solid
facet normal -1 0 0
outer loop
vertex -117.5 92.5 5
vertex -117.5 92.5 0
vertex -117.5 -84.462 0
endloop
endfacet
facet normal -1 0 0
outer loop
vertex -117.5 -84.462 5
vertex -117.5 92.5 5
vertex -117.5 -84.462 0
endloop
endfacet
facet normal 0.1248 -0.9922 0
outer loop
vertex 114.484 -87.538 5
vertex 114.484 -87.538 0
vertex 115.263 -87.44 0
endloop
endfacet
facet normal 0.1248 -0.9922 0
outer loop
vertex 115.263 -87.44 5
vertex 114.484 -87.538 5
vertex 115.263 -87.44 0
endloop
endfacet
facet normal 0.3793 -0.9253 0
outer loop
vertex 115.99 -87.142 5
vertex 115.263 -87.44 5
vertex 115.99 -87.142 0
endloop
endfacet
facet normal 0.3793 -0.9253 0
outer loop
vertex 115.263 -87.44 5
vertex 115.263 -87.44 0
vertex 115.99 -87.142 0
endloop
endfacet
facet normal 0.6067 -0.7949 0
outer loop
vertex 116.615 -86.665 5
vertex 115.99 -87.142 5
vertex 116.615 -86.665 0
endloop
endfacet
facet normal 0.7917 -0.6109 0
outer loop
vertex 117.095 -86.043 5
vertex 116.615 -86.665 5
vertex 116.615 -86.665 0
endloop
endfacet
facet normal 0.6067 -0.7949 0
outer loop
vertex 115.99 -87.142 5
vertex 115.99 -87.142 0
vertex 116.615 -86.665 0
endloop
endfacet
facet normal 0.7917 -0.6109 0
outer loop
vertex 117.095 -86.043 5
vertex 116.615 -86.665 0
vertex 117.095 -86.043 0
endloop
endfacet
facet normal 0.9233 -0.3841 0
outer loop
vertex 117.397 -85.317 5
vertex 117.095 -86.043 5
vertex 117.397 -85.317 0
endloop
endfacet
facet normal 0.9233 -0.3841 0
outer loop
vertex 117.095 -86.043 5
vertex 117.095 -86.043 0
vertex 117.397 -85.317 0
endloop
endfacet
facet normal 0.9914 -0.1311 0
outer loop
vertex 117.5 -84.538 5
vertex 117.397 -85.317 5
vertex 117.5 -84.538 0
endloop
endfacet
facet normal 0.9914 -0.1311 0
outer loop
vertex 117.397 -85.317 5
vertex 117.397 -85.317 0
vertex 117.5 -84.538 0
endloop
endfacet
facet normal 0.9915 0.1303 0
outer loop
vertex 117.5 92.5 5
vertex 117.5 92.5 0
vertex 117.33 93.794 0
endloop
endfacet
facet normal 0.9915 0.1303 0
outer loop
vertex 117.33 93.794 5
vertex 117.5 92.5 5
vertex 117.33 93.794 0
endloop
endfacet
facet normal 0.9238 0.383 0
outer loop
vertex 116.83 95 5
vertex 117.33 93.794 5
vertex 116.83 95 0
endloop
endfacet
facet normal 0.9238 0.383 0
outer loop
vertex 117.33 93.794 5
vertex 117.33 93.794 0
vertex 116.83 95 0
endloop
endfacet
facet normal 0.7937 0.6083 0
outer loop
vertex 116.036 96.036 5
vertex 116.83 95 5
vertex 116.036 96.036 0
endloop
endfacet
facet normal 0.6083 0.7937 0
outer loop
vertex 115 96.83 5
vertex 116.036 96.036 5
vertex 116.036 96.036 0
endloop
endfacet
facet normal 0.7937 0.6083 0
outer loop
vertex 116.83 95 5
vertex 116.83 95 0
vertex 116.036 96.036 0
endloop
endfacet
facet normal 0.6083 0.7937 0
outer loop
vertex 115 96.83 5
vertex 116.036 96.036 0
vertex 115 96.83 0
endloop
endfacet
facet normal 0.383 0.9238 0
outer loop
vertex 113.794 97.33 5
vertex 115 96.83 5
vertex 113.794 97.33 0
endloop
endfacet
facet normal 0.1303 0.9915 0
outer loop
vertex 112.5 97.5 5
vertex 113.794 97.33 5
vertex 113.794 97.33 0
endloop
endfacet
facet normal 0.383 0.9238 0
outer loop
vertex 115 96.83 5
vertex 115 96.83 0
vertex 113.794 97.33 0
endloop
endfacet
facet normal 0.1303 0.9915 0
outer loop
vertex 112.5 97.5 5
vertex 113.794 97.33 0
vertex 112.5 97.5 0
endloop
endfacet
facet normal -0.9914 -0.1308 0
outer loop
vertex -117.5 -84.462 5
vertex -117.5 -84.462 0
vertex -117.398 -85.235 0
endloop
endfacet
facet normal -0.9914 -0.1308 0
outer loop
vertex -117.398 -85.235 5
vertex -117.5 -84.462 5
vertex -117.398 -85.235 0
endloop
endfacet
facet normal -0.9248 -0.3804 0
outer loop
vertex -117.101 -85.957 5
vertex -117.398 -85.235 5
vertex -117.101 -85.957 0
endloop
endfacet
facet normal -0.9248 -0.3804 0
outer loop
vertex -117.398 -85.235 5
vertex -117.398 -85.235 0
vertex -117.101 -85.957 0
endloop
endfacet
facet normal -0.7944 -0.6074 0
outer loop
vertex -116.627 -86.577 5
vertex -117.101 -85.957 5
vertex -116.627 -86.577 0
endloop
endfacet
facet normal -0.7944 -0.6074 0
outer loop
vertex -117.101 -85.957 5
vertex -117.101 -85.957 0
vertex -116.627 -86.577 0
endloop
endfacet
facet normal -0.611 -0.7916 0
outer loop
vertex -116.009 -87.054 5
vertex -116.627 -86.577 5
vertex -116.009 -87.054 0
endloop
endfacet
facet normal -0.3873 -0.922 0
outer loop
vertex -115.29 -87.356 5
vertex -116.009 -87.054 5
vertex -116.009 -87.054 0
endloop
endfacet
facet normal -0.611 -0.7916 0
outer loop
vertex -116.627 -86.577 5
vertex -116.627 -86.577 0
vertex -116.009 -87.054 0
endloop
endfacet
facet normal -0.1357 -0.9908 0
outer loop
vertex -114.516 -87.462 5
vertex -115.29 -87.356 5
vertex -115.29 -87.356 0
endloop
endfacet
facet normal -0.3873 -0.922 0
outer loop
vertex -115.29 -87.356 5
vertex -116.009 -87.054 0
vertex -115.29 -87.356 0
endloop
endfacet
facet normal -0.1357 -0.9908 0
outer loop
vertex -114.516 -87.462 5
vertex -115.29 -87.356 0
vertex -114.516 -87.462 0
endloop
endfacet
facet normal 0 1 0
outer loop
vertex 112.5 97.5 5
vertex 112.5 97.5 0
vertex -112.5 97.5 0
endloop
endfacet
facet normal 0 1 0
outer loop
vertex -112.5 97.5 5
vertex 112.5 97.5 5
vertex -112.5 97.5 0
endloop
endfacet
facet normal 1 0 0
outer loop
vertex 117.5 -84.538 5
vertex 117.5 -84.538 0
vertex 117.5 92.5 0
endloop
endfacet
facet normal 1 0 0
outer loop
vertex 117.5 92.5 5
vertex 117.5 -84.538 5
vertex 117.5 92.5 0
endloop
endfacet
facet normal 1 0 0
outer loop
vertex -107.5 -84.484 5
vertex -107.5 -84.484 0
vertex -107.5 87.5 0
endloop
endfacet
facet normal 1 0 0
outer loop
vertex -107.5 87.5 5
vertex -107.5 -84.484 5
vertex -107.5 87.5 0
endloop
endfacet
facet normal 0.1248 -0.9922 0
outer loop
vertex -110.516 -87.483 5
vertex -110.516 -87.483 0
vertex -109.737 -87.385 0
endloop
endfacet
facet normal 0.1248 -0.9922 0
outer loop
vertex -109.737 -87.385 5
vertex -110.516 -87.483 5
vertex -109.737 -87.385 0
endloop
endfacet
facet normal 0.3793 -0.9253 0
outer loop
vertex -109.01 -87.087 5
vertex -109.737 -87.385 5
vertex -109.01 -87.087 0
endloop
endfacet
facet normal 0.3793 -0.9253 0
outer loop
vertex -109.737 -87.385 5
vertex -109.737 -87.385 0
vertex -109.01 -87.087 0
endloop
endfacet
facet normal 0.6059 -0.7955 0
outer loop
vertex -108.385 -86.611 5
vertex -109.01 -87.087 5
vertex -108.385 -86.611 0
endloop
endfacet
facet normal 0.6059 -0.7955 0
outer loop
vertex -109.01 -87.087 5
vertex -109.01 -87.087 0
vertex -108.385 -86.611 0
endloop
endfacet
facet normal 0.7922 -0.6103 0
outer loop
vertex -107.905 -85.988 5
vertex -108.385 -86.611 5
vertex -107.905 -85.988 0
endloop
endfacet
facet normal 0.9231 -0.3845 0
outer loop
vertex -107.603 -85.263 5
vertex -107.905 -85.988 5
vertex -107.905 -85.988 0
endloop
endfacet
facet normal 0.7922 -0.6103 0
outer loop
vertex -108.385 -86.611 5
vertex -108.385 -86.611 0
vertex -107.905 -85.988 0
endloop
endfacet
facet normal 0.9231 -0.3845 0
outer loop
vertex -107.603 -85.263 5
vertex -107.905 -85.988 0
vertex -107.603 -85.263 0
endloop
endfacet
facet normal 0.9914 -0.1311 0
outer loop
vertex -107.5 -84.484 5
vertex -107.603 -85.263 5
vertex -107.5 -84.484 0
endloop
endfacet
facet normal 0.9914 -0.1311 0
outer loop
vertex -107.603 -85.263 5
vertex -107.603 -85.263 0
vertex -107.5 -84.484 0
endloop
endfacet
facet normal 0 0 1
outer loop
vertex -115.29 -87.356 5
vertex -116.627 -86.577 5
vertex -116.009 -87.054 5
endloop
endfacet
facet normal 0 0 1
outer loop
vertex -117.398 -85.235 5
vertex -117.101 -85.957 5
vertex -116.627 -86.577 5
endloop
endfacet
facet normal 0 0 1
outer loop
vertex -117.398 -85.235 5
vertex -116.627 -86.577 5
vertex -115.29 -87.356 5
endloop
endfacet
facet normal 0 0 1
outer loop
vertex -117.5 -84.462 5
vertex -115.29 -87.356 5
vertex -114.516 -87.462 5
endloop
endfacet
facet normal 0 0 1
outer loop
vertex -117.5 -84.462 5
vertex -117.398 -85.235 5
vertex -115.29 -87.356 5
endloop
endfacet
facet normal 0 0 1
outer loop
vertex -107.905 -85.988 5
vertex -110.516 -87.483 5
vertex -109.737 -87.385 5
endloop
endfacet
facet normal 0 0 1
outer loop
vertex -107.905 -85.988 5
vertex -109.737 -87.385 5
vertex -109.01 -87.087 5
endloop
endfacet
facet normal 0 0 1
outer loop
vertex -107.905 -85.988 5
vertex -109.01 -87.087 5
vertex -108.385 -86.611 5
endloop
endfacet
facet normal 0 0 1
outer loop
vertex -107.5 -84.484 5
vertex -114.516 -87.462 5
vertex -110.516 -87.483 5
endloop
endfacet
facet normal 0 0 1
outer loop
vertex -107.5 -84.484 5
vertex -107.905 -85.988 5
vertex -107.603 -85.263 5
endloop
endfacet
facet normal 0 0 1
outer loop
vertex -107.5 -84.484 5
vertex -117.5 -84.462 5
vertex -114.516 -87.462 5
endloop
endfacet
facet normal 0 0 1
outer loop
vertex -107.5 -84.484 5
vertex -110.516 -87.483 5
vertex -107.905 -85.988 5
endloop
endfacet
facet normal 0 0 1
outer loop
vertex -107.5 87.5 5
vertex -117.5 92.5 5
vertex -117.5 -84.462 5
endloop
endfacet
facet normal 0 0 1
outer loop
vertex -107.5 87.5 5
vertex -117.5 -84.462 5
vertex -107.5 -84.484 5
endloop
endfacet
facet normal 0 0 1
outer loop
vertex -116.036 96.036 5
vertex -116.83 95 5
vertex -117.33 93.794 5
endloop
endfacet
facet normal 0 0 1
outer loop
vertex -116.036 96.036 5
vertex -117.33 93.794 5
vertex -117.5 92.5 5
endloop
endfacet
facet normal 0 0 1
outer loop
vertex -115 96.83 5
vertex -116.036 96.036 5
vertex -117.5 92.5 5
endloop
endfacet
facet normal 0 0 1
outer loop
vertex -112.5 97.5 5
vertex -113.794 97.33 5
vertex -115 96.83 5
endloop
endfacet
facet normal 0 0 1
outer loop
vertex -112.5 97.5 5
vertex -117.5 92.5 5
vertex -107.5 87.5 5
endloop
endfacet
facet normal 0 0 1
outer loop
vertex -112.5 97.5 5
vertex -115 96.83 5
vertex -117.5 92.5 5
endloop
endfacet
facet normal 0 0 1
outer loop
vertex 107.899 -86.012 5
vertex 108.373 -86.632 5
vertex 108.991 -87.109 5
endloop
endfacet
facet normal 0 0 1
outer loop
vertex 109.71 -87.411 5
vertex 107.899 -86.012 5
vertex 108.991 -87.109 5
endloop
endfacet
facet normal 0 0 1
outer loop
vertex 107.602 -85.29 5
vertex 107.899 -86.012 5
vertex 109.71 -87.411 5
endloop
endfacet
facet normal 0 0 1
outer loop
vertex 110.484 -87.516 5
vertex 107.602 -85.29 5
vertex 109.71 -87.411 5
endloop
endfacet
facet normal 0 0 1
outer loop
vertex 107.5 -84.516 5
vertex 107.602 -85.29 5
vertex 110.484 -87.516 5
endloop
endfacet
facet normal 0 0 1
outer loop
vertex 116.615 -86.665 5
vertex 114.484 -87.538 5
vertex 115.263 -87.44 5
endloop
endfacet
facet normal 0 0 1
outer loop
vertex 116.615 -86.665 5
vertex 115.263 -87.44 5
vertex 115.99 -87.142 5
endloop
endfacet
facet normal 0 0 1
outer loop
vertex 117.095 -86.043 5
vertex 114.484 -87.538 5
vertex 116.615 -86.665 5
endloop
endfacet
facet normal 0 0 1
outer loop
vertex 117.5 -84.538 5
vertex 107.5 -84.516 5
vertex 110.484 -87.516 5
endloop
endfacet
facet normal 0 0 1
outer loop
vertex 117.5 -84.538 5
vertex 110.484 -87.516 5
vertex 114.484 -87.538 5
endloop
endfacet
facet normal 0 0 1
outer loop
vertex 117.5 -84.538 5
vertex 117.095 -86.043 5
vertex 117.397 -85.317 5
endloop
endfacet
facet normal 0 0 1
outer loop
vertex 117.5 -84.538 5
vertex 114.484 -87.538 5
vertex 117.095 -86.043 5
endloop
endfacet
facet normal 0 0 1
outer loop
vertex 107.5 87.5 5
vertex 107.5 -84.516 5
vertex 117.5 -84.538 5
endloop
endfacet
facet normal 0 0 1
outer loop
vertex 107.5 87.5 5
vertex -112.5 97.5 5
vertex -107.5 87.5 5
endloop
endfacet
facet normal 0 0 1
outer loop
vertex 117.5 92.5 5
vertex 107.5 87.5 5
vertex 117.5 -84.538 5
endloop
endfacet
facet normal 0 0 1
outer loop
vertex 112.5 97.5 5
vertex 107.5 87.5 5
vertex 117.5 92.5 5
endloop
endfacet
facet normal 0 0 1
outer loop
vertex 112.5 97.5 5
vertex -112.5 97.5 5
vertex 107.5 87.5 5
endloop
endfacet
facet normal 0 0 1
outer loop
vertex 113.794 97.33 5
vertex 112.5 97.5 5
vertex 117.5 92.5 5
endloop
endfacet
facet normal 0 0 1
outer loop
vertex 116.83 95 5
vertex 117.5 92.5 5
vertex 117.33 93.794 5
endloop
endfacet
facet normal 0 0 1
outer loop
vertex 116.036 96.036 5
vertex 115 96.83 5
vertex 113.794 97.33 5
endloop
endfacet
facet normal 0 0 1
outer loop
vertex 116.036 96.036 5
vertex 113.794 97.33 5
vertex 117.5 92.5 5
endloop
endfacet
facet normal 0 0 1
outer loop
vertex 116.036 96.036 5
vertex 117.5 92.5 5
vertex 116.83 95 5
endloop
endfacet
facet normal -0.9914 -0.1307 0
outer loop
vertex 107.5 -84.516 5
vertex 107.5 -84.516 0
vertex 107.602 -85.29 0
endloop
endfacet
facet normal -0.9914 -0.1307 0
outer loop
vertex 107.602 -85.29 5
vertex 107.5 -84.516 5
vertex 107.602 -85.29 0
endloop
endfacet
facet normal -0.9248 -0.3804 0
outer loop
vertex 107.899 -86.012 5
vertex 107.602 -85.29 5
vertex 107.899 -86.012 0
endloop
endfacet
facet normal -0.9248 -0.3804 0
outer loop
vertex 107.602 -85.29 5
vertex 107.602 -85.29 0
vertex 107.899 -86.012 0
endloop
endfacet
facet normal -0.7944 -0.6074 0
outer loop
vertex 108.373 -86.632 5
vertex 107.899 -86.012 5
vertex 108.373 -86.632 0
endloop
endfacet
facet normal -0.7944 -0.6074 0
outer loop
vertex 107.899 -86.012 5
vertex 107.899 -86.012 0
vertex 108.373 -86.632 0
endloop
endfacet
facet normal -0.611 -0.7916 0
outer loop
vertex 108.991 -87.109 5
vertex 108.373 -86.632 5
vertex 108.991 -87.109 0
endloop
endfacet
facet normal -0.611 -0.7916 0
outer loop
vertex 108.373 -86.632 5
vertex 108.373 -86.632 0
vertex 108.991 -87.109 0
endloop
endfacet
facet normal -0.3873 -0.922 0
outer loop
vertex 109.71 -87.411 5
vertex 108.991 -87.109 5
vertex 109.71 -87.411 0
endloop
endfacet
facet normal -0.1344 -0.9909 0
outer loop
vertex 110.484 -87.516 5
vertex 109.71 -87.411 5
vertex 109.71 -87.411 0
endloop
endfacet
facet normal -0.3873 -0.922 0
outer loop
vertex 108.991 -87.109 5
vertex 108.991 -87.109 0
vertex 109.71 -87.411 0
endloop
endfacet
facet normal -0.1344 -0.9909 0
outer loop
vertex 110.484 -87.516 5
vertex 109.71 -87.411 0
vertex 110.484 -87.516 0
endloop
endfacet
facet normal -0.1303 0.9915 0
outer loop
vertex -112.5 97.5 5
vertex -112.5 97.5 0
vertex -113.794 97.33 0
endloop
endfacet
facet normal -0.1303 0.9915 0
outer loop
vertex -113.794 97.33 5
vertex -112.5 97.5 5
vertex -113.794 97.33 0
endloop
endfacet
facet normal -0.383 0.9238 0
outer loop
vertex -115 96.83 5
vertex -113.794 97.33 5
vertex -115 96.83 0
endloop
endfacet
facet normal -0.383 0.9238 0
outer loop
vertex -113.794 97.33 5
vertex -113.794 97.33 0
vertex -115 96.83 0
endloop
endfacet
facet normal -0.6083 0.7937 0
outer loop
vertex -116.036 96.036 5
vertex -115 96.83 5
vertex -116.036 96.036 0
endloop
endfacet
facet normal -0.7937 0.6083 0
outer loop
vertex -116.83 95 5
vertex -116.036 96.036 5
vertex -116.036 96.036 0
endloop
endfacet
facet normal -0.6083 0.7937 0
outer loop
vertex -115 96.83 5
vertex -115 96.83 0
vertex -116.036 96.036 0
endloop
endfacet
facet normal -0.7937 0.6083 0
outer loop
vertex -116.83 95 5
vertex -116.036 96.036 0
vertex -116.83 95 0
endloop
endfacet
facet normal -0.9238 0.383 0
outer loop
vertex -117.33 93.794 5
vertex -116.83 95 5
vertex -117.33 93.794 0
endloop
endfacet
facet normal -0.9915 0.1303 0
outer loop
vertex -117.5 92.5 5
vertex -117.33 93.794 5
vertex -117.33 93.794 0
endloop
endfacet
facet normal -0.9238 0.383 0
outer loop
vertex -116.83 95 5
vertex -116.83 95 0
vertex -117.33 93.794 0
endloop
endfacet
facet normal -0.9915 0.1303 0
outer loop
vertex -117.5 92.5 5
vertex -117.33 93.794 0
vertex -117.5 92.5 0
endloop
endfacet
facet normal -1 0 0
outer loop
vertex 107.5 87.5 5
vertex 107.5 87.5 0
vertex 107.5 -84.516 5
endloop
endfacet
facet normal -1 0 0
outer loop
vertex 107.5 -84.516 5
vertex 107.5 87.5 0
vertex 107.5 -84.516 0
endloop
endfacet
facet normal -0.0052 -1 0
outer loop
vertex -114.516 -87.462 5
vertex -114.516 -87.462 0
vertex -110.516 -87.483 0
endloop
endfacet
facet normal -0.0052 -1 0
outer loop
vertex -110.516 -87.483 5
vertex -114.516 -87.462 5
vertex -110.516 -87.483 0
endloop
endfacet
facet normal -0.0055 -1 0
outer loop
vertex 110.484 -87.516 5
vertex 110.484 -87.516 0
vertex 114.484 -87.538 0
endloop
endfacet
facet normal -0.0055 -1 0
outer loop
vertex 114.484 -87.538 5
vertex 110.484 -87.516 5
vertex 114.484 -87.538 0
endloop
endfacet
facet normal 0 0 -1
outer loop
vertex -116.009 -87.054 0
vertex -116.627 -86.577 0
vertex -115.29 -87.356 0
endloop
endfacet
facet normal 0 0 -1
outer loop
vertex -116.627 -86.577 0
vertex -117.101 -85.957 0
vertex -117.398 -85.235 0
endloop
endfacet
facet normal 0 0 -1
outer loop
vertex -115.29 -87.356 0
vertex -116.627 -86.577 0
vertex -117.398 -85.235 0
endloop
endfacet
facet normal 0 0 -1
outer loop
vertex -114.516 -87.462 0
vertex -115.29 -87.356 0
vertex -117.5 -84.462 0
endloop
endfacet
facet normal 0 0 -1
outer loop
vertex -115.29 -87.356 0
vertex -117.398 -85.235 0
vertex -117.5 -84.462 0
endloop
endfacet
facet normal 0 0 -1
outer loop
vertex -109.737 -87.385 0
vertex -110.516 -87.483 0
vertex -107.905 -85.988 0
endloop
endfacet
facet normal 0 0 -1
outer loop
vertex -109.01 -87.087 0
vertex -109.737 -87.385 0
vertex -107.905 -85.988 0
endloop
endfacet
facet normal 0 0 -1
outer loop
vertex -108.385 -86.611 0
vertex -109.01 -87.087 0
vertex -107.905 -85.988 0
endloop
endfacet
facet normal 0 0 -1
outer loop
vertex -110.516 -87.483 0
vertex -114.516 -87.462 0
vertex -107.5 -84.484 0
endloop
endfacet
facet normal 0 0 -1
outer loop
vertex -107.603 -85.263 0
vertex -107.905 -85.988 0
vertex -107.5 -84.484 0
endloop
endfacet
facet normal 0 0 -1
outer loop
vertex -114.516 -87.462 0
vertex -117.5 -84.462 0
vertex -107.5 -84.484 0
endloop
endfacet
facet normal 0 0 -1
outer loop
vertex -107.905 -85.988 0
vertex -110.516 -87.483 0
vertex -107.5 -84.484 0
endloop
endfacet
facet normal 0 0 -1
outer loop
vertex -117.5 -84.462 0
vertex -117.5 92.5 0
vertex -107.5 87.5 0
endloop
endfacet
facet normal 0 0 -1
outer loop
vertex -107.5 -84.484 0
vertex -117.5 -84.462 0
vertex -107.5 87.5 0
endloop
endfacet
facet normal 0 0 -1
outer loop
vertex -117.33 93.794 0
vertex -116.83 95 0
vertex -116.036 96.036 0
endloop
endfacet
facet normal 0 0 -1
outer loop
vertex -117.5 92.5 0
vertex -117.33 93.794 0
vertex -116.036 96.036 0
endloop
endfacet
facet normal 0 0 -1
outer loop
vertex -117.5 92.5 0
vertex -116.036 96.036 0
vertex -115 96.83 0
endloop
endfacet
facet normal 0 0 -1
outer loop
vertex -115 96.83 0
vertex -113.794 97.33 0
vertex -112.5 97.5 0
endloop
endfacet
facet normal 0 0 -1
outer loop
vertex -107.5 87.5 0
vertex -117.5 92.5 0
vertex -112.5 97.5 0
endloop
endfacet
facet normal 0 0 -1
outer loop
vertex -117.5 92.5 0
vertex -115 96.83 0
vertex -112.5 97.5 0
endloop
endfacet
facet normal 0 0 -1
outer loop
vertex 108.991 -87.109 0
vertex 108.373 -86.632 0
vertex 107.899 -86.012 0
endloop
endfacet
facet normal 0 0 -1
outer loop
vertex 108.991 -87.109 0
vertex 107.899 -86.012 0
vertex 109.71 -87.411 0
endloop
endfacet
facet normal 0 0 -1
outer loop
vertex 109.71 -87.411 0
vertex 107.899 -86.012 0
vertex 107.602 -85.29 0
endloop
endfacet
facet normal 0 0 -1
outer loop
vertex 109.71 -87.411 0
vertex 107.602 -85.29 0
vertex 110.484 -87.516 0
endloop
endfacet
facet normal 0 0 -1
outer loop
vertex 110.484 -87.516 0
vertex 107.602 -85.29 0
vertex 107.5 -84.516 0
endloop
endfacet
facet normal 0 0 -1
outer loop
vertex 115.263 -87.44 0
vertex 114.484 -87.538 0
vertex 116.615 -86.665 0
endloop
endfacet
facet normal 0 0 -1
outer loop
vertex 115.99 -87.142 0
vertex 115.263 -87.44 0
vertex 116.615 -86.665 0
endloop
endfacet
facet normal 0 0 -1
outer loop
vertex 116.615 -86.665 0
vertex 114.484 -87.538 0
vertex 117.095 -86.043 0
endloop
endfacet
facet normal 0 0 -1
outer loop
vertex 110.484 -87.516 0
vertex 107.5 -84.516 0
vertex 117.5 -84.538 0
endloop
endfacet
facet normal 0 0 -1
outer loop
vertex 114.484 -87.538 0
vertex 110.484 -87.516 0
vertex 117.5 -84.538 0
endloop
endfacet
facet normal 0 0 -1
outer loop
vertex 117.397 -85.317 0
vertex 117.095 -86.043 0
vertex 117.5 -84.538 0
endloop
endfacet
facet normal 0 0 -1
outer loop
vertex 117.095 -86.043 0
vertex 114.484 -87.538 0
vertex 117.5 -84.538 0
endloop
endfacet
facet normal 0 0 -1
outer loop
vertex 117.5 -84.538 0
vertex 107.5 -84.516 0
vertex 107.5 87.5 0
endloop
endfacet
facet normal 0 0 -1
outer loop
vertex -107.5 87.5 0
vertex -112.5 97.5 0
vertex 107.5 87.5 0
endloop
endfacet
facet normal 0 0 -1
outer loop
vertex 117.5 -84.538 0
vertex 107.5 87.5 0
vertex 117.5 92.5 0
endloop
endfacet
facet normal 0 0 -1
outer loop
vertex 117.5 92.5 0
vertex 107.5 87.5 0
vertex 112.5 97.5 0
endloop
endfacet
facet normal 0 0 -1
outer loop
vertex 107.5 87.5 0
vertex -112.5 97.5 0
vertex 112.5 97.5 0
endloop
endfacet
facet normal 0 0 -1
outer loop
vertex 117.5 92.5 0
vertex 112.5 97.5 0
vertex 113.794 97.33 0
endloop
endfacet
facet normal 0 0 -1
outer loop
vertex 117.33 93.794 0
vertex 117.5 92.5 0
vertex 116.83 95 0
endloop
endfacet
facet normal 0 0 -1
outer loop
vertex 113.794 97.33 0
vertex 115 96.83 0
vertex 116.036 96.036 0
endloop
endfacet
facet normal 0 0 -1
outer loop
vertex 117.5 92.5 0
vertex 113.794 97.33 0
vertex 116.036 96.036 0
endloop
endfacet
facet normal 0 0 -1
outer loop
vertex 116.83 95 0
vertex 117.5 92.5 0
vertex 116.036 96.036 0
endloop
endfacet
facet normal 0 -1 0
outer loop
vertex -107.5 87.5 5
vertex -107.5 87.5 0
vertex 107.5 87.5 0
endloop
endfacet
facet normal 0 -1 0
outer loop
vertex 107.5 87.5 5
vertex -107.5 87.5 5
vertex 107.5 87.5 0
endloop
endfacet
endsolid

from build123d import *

# Parameters (mm, degrees)
F1_DEPTH = 5


with BuildPart() as f1:
    # F0 (on Top) → F1 (new body)
    with BuildSketch(Plane.XY):
        with BuildLine():
            Line((-107.5, 87.5), (107.5, 87.5))
            Line((107.5, 87.5), (107.5, -84.516405))
            ThreePointArc((107.5, -84.516405), (108.372872, -86.631901), (110.483551, -87.516359))
            Line((110.483551, -87.516359), (114.483551, -87.538292))
            ThreePointArc((114.483551, -87.538292), (116.615497, -86.665465), (117.5, -84.538337))
            Line((117.5, -84.538337), (117.5, 92.5))
            ThreePointArc((117.5, 92.5), (116.035534, 96.035534), (112.5, 97.5))
            Line((112.5, 97.5), (-112.5, 97.5))
            ThreePointArc((-112.5, 97.5), (-116.035534, 96.035534), (-117.5, 92.5))
            Line((-117.5, 92.5), (-117.5, -84.461572))
            ThreePointArc((-117.5, -84.461572), (-116.627128, -86.577069), (-114.516449, -87.461527))
            Line((-114.516449, -87.461527), (-110.516449, -87.48346))
            ThreePointArc((-110.516449, -87.48346), (-108.384503, -86.610633), (-107.5, -84.483505))
            Line((-107.5, -84.483505), (-107.5, 87.5))
        make_face()
    extrude(amount=F1_DEPTH)


solid = f1.part
